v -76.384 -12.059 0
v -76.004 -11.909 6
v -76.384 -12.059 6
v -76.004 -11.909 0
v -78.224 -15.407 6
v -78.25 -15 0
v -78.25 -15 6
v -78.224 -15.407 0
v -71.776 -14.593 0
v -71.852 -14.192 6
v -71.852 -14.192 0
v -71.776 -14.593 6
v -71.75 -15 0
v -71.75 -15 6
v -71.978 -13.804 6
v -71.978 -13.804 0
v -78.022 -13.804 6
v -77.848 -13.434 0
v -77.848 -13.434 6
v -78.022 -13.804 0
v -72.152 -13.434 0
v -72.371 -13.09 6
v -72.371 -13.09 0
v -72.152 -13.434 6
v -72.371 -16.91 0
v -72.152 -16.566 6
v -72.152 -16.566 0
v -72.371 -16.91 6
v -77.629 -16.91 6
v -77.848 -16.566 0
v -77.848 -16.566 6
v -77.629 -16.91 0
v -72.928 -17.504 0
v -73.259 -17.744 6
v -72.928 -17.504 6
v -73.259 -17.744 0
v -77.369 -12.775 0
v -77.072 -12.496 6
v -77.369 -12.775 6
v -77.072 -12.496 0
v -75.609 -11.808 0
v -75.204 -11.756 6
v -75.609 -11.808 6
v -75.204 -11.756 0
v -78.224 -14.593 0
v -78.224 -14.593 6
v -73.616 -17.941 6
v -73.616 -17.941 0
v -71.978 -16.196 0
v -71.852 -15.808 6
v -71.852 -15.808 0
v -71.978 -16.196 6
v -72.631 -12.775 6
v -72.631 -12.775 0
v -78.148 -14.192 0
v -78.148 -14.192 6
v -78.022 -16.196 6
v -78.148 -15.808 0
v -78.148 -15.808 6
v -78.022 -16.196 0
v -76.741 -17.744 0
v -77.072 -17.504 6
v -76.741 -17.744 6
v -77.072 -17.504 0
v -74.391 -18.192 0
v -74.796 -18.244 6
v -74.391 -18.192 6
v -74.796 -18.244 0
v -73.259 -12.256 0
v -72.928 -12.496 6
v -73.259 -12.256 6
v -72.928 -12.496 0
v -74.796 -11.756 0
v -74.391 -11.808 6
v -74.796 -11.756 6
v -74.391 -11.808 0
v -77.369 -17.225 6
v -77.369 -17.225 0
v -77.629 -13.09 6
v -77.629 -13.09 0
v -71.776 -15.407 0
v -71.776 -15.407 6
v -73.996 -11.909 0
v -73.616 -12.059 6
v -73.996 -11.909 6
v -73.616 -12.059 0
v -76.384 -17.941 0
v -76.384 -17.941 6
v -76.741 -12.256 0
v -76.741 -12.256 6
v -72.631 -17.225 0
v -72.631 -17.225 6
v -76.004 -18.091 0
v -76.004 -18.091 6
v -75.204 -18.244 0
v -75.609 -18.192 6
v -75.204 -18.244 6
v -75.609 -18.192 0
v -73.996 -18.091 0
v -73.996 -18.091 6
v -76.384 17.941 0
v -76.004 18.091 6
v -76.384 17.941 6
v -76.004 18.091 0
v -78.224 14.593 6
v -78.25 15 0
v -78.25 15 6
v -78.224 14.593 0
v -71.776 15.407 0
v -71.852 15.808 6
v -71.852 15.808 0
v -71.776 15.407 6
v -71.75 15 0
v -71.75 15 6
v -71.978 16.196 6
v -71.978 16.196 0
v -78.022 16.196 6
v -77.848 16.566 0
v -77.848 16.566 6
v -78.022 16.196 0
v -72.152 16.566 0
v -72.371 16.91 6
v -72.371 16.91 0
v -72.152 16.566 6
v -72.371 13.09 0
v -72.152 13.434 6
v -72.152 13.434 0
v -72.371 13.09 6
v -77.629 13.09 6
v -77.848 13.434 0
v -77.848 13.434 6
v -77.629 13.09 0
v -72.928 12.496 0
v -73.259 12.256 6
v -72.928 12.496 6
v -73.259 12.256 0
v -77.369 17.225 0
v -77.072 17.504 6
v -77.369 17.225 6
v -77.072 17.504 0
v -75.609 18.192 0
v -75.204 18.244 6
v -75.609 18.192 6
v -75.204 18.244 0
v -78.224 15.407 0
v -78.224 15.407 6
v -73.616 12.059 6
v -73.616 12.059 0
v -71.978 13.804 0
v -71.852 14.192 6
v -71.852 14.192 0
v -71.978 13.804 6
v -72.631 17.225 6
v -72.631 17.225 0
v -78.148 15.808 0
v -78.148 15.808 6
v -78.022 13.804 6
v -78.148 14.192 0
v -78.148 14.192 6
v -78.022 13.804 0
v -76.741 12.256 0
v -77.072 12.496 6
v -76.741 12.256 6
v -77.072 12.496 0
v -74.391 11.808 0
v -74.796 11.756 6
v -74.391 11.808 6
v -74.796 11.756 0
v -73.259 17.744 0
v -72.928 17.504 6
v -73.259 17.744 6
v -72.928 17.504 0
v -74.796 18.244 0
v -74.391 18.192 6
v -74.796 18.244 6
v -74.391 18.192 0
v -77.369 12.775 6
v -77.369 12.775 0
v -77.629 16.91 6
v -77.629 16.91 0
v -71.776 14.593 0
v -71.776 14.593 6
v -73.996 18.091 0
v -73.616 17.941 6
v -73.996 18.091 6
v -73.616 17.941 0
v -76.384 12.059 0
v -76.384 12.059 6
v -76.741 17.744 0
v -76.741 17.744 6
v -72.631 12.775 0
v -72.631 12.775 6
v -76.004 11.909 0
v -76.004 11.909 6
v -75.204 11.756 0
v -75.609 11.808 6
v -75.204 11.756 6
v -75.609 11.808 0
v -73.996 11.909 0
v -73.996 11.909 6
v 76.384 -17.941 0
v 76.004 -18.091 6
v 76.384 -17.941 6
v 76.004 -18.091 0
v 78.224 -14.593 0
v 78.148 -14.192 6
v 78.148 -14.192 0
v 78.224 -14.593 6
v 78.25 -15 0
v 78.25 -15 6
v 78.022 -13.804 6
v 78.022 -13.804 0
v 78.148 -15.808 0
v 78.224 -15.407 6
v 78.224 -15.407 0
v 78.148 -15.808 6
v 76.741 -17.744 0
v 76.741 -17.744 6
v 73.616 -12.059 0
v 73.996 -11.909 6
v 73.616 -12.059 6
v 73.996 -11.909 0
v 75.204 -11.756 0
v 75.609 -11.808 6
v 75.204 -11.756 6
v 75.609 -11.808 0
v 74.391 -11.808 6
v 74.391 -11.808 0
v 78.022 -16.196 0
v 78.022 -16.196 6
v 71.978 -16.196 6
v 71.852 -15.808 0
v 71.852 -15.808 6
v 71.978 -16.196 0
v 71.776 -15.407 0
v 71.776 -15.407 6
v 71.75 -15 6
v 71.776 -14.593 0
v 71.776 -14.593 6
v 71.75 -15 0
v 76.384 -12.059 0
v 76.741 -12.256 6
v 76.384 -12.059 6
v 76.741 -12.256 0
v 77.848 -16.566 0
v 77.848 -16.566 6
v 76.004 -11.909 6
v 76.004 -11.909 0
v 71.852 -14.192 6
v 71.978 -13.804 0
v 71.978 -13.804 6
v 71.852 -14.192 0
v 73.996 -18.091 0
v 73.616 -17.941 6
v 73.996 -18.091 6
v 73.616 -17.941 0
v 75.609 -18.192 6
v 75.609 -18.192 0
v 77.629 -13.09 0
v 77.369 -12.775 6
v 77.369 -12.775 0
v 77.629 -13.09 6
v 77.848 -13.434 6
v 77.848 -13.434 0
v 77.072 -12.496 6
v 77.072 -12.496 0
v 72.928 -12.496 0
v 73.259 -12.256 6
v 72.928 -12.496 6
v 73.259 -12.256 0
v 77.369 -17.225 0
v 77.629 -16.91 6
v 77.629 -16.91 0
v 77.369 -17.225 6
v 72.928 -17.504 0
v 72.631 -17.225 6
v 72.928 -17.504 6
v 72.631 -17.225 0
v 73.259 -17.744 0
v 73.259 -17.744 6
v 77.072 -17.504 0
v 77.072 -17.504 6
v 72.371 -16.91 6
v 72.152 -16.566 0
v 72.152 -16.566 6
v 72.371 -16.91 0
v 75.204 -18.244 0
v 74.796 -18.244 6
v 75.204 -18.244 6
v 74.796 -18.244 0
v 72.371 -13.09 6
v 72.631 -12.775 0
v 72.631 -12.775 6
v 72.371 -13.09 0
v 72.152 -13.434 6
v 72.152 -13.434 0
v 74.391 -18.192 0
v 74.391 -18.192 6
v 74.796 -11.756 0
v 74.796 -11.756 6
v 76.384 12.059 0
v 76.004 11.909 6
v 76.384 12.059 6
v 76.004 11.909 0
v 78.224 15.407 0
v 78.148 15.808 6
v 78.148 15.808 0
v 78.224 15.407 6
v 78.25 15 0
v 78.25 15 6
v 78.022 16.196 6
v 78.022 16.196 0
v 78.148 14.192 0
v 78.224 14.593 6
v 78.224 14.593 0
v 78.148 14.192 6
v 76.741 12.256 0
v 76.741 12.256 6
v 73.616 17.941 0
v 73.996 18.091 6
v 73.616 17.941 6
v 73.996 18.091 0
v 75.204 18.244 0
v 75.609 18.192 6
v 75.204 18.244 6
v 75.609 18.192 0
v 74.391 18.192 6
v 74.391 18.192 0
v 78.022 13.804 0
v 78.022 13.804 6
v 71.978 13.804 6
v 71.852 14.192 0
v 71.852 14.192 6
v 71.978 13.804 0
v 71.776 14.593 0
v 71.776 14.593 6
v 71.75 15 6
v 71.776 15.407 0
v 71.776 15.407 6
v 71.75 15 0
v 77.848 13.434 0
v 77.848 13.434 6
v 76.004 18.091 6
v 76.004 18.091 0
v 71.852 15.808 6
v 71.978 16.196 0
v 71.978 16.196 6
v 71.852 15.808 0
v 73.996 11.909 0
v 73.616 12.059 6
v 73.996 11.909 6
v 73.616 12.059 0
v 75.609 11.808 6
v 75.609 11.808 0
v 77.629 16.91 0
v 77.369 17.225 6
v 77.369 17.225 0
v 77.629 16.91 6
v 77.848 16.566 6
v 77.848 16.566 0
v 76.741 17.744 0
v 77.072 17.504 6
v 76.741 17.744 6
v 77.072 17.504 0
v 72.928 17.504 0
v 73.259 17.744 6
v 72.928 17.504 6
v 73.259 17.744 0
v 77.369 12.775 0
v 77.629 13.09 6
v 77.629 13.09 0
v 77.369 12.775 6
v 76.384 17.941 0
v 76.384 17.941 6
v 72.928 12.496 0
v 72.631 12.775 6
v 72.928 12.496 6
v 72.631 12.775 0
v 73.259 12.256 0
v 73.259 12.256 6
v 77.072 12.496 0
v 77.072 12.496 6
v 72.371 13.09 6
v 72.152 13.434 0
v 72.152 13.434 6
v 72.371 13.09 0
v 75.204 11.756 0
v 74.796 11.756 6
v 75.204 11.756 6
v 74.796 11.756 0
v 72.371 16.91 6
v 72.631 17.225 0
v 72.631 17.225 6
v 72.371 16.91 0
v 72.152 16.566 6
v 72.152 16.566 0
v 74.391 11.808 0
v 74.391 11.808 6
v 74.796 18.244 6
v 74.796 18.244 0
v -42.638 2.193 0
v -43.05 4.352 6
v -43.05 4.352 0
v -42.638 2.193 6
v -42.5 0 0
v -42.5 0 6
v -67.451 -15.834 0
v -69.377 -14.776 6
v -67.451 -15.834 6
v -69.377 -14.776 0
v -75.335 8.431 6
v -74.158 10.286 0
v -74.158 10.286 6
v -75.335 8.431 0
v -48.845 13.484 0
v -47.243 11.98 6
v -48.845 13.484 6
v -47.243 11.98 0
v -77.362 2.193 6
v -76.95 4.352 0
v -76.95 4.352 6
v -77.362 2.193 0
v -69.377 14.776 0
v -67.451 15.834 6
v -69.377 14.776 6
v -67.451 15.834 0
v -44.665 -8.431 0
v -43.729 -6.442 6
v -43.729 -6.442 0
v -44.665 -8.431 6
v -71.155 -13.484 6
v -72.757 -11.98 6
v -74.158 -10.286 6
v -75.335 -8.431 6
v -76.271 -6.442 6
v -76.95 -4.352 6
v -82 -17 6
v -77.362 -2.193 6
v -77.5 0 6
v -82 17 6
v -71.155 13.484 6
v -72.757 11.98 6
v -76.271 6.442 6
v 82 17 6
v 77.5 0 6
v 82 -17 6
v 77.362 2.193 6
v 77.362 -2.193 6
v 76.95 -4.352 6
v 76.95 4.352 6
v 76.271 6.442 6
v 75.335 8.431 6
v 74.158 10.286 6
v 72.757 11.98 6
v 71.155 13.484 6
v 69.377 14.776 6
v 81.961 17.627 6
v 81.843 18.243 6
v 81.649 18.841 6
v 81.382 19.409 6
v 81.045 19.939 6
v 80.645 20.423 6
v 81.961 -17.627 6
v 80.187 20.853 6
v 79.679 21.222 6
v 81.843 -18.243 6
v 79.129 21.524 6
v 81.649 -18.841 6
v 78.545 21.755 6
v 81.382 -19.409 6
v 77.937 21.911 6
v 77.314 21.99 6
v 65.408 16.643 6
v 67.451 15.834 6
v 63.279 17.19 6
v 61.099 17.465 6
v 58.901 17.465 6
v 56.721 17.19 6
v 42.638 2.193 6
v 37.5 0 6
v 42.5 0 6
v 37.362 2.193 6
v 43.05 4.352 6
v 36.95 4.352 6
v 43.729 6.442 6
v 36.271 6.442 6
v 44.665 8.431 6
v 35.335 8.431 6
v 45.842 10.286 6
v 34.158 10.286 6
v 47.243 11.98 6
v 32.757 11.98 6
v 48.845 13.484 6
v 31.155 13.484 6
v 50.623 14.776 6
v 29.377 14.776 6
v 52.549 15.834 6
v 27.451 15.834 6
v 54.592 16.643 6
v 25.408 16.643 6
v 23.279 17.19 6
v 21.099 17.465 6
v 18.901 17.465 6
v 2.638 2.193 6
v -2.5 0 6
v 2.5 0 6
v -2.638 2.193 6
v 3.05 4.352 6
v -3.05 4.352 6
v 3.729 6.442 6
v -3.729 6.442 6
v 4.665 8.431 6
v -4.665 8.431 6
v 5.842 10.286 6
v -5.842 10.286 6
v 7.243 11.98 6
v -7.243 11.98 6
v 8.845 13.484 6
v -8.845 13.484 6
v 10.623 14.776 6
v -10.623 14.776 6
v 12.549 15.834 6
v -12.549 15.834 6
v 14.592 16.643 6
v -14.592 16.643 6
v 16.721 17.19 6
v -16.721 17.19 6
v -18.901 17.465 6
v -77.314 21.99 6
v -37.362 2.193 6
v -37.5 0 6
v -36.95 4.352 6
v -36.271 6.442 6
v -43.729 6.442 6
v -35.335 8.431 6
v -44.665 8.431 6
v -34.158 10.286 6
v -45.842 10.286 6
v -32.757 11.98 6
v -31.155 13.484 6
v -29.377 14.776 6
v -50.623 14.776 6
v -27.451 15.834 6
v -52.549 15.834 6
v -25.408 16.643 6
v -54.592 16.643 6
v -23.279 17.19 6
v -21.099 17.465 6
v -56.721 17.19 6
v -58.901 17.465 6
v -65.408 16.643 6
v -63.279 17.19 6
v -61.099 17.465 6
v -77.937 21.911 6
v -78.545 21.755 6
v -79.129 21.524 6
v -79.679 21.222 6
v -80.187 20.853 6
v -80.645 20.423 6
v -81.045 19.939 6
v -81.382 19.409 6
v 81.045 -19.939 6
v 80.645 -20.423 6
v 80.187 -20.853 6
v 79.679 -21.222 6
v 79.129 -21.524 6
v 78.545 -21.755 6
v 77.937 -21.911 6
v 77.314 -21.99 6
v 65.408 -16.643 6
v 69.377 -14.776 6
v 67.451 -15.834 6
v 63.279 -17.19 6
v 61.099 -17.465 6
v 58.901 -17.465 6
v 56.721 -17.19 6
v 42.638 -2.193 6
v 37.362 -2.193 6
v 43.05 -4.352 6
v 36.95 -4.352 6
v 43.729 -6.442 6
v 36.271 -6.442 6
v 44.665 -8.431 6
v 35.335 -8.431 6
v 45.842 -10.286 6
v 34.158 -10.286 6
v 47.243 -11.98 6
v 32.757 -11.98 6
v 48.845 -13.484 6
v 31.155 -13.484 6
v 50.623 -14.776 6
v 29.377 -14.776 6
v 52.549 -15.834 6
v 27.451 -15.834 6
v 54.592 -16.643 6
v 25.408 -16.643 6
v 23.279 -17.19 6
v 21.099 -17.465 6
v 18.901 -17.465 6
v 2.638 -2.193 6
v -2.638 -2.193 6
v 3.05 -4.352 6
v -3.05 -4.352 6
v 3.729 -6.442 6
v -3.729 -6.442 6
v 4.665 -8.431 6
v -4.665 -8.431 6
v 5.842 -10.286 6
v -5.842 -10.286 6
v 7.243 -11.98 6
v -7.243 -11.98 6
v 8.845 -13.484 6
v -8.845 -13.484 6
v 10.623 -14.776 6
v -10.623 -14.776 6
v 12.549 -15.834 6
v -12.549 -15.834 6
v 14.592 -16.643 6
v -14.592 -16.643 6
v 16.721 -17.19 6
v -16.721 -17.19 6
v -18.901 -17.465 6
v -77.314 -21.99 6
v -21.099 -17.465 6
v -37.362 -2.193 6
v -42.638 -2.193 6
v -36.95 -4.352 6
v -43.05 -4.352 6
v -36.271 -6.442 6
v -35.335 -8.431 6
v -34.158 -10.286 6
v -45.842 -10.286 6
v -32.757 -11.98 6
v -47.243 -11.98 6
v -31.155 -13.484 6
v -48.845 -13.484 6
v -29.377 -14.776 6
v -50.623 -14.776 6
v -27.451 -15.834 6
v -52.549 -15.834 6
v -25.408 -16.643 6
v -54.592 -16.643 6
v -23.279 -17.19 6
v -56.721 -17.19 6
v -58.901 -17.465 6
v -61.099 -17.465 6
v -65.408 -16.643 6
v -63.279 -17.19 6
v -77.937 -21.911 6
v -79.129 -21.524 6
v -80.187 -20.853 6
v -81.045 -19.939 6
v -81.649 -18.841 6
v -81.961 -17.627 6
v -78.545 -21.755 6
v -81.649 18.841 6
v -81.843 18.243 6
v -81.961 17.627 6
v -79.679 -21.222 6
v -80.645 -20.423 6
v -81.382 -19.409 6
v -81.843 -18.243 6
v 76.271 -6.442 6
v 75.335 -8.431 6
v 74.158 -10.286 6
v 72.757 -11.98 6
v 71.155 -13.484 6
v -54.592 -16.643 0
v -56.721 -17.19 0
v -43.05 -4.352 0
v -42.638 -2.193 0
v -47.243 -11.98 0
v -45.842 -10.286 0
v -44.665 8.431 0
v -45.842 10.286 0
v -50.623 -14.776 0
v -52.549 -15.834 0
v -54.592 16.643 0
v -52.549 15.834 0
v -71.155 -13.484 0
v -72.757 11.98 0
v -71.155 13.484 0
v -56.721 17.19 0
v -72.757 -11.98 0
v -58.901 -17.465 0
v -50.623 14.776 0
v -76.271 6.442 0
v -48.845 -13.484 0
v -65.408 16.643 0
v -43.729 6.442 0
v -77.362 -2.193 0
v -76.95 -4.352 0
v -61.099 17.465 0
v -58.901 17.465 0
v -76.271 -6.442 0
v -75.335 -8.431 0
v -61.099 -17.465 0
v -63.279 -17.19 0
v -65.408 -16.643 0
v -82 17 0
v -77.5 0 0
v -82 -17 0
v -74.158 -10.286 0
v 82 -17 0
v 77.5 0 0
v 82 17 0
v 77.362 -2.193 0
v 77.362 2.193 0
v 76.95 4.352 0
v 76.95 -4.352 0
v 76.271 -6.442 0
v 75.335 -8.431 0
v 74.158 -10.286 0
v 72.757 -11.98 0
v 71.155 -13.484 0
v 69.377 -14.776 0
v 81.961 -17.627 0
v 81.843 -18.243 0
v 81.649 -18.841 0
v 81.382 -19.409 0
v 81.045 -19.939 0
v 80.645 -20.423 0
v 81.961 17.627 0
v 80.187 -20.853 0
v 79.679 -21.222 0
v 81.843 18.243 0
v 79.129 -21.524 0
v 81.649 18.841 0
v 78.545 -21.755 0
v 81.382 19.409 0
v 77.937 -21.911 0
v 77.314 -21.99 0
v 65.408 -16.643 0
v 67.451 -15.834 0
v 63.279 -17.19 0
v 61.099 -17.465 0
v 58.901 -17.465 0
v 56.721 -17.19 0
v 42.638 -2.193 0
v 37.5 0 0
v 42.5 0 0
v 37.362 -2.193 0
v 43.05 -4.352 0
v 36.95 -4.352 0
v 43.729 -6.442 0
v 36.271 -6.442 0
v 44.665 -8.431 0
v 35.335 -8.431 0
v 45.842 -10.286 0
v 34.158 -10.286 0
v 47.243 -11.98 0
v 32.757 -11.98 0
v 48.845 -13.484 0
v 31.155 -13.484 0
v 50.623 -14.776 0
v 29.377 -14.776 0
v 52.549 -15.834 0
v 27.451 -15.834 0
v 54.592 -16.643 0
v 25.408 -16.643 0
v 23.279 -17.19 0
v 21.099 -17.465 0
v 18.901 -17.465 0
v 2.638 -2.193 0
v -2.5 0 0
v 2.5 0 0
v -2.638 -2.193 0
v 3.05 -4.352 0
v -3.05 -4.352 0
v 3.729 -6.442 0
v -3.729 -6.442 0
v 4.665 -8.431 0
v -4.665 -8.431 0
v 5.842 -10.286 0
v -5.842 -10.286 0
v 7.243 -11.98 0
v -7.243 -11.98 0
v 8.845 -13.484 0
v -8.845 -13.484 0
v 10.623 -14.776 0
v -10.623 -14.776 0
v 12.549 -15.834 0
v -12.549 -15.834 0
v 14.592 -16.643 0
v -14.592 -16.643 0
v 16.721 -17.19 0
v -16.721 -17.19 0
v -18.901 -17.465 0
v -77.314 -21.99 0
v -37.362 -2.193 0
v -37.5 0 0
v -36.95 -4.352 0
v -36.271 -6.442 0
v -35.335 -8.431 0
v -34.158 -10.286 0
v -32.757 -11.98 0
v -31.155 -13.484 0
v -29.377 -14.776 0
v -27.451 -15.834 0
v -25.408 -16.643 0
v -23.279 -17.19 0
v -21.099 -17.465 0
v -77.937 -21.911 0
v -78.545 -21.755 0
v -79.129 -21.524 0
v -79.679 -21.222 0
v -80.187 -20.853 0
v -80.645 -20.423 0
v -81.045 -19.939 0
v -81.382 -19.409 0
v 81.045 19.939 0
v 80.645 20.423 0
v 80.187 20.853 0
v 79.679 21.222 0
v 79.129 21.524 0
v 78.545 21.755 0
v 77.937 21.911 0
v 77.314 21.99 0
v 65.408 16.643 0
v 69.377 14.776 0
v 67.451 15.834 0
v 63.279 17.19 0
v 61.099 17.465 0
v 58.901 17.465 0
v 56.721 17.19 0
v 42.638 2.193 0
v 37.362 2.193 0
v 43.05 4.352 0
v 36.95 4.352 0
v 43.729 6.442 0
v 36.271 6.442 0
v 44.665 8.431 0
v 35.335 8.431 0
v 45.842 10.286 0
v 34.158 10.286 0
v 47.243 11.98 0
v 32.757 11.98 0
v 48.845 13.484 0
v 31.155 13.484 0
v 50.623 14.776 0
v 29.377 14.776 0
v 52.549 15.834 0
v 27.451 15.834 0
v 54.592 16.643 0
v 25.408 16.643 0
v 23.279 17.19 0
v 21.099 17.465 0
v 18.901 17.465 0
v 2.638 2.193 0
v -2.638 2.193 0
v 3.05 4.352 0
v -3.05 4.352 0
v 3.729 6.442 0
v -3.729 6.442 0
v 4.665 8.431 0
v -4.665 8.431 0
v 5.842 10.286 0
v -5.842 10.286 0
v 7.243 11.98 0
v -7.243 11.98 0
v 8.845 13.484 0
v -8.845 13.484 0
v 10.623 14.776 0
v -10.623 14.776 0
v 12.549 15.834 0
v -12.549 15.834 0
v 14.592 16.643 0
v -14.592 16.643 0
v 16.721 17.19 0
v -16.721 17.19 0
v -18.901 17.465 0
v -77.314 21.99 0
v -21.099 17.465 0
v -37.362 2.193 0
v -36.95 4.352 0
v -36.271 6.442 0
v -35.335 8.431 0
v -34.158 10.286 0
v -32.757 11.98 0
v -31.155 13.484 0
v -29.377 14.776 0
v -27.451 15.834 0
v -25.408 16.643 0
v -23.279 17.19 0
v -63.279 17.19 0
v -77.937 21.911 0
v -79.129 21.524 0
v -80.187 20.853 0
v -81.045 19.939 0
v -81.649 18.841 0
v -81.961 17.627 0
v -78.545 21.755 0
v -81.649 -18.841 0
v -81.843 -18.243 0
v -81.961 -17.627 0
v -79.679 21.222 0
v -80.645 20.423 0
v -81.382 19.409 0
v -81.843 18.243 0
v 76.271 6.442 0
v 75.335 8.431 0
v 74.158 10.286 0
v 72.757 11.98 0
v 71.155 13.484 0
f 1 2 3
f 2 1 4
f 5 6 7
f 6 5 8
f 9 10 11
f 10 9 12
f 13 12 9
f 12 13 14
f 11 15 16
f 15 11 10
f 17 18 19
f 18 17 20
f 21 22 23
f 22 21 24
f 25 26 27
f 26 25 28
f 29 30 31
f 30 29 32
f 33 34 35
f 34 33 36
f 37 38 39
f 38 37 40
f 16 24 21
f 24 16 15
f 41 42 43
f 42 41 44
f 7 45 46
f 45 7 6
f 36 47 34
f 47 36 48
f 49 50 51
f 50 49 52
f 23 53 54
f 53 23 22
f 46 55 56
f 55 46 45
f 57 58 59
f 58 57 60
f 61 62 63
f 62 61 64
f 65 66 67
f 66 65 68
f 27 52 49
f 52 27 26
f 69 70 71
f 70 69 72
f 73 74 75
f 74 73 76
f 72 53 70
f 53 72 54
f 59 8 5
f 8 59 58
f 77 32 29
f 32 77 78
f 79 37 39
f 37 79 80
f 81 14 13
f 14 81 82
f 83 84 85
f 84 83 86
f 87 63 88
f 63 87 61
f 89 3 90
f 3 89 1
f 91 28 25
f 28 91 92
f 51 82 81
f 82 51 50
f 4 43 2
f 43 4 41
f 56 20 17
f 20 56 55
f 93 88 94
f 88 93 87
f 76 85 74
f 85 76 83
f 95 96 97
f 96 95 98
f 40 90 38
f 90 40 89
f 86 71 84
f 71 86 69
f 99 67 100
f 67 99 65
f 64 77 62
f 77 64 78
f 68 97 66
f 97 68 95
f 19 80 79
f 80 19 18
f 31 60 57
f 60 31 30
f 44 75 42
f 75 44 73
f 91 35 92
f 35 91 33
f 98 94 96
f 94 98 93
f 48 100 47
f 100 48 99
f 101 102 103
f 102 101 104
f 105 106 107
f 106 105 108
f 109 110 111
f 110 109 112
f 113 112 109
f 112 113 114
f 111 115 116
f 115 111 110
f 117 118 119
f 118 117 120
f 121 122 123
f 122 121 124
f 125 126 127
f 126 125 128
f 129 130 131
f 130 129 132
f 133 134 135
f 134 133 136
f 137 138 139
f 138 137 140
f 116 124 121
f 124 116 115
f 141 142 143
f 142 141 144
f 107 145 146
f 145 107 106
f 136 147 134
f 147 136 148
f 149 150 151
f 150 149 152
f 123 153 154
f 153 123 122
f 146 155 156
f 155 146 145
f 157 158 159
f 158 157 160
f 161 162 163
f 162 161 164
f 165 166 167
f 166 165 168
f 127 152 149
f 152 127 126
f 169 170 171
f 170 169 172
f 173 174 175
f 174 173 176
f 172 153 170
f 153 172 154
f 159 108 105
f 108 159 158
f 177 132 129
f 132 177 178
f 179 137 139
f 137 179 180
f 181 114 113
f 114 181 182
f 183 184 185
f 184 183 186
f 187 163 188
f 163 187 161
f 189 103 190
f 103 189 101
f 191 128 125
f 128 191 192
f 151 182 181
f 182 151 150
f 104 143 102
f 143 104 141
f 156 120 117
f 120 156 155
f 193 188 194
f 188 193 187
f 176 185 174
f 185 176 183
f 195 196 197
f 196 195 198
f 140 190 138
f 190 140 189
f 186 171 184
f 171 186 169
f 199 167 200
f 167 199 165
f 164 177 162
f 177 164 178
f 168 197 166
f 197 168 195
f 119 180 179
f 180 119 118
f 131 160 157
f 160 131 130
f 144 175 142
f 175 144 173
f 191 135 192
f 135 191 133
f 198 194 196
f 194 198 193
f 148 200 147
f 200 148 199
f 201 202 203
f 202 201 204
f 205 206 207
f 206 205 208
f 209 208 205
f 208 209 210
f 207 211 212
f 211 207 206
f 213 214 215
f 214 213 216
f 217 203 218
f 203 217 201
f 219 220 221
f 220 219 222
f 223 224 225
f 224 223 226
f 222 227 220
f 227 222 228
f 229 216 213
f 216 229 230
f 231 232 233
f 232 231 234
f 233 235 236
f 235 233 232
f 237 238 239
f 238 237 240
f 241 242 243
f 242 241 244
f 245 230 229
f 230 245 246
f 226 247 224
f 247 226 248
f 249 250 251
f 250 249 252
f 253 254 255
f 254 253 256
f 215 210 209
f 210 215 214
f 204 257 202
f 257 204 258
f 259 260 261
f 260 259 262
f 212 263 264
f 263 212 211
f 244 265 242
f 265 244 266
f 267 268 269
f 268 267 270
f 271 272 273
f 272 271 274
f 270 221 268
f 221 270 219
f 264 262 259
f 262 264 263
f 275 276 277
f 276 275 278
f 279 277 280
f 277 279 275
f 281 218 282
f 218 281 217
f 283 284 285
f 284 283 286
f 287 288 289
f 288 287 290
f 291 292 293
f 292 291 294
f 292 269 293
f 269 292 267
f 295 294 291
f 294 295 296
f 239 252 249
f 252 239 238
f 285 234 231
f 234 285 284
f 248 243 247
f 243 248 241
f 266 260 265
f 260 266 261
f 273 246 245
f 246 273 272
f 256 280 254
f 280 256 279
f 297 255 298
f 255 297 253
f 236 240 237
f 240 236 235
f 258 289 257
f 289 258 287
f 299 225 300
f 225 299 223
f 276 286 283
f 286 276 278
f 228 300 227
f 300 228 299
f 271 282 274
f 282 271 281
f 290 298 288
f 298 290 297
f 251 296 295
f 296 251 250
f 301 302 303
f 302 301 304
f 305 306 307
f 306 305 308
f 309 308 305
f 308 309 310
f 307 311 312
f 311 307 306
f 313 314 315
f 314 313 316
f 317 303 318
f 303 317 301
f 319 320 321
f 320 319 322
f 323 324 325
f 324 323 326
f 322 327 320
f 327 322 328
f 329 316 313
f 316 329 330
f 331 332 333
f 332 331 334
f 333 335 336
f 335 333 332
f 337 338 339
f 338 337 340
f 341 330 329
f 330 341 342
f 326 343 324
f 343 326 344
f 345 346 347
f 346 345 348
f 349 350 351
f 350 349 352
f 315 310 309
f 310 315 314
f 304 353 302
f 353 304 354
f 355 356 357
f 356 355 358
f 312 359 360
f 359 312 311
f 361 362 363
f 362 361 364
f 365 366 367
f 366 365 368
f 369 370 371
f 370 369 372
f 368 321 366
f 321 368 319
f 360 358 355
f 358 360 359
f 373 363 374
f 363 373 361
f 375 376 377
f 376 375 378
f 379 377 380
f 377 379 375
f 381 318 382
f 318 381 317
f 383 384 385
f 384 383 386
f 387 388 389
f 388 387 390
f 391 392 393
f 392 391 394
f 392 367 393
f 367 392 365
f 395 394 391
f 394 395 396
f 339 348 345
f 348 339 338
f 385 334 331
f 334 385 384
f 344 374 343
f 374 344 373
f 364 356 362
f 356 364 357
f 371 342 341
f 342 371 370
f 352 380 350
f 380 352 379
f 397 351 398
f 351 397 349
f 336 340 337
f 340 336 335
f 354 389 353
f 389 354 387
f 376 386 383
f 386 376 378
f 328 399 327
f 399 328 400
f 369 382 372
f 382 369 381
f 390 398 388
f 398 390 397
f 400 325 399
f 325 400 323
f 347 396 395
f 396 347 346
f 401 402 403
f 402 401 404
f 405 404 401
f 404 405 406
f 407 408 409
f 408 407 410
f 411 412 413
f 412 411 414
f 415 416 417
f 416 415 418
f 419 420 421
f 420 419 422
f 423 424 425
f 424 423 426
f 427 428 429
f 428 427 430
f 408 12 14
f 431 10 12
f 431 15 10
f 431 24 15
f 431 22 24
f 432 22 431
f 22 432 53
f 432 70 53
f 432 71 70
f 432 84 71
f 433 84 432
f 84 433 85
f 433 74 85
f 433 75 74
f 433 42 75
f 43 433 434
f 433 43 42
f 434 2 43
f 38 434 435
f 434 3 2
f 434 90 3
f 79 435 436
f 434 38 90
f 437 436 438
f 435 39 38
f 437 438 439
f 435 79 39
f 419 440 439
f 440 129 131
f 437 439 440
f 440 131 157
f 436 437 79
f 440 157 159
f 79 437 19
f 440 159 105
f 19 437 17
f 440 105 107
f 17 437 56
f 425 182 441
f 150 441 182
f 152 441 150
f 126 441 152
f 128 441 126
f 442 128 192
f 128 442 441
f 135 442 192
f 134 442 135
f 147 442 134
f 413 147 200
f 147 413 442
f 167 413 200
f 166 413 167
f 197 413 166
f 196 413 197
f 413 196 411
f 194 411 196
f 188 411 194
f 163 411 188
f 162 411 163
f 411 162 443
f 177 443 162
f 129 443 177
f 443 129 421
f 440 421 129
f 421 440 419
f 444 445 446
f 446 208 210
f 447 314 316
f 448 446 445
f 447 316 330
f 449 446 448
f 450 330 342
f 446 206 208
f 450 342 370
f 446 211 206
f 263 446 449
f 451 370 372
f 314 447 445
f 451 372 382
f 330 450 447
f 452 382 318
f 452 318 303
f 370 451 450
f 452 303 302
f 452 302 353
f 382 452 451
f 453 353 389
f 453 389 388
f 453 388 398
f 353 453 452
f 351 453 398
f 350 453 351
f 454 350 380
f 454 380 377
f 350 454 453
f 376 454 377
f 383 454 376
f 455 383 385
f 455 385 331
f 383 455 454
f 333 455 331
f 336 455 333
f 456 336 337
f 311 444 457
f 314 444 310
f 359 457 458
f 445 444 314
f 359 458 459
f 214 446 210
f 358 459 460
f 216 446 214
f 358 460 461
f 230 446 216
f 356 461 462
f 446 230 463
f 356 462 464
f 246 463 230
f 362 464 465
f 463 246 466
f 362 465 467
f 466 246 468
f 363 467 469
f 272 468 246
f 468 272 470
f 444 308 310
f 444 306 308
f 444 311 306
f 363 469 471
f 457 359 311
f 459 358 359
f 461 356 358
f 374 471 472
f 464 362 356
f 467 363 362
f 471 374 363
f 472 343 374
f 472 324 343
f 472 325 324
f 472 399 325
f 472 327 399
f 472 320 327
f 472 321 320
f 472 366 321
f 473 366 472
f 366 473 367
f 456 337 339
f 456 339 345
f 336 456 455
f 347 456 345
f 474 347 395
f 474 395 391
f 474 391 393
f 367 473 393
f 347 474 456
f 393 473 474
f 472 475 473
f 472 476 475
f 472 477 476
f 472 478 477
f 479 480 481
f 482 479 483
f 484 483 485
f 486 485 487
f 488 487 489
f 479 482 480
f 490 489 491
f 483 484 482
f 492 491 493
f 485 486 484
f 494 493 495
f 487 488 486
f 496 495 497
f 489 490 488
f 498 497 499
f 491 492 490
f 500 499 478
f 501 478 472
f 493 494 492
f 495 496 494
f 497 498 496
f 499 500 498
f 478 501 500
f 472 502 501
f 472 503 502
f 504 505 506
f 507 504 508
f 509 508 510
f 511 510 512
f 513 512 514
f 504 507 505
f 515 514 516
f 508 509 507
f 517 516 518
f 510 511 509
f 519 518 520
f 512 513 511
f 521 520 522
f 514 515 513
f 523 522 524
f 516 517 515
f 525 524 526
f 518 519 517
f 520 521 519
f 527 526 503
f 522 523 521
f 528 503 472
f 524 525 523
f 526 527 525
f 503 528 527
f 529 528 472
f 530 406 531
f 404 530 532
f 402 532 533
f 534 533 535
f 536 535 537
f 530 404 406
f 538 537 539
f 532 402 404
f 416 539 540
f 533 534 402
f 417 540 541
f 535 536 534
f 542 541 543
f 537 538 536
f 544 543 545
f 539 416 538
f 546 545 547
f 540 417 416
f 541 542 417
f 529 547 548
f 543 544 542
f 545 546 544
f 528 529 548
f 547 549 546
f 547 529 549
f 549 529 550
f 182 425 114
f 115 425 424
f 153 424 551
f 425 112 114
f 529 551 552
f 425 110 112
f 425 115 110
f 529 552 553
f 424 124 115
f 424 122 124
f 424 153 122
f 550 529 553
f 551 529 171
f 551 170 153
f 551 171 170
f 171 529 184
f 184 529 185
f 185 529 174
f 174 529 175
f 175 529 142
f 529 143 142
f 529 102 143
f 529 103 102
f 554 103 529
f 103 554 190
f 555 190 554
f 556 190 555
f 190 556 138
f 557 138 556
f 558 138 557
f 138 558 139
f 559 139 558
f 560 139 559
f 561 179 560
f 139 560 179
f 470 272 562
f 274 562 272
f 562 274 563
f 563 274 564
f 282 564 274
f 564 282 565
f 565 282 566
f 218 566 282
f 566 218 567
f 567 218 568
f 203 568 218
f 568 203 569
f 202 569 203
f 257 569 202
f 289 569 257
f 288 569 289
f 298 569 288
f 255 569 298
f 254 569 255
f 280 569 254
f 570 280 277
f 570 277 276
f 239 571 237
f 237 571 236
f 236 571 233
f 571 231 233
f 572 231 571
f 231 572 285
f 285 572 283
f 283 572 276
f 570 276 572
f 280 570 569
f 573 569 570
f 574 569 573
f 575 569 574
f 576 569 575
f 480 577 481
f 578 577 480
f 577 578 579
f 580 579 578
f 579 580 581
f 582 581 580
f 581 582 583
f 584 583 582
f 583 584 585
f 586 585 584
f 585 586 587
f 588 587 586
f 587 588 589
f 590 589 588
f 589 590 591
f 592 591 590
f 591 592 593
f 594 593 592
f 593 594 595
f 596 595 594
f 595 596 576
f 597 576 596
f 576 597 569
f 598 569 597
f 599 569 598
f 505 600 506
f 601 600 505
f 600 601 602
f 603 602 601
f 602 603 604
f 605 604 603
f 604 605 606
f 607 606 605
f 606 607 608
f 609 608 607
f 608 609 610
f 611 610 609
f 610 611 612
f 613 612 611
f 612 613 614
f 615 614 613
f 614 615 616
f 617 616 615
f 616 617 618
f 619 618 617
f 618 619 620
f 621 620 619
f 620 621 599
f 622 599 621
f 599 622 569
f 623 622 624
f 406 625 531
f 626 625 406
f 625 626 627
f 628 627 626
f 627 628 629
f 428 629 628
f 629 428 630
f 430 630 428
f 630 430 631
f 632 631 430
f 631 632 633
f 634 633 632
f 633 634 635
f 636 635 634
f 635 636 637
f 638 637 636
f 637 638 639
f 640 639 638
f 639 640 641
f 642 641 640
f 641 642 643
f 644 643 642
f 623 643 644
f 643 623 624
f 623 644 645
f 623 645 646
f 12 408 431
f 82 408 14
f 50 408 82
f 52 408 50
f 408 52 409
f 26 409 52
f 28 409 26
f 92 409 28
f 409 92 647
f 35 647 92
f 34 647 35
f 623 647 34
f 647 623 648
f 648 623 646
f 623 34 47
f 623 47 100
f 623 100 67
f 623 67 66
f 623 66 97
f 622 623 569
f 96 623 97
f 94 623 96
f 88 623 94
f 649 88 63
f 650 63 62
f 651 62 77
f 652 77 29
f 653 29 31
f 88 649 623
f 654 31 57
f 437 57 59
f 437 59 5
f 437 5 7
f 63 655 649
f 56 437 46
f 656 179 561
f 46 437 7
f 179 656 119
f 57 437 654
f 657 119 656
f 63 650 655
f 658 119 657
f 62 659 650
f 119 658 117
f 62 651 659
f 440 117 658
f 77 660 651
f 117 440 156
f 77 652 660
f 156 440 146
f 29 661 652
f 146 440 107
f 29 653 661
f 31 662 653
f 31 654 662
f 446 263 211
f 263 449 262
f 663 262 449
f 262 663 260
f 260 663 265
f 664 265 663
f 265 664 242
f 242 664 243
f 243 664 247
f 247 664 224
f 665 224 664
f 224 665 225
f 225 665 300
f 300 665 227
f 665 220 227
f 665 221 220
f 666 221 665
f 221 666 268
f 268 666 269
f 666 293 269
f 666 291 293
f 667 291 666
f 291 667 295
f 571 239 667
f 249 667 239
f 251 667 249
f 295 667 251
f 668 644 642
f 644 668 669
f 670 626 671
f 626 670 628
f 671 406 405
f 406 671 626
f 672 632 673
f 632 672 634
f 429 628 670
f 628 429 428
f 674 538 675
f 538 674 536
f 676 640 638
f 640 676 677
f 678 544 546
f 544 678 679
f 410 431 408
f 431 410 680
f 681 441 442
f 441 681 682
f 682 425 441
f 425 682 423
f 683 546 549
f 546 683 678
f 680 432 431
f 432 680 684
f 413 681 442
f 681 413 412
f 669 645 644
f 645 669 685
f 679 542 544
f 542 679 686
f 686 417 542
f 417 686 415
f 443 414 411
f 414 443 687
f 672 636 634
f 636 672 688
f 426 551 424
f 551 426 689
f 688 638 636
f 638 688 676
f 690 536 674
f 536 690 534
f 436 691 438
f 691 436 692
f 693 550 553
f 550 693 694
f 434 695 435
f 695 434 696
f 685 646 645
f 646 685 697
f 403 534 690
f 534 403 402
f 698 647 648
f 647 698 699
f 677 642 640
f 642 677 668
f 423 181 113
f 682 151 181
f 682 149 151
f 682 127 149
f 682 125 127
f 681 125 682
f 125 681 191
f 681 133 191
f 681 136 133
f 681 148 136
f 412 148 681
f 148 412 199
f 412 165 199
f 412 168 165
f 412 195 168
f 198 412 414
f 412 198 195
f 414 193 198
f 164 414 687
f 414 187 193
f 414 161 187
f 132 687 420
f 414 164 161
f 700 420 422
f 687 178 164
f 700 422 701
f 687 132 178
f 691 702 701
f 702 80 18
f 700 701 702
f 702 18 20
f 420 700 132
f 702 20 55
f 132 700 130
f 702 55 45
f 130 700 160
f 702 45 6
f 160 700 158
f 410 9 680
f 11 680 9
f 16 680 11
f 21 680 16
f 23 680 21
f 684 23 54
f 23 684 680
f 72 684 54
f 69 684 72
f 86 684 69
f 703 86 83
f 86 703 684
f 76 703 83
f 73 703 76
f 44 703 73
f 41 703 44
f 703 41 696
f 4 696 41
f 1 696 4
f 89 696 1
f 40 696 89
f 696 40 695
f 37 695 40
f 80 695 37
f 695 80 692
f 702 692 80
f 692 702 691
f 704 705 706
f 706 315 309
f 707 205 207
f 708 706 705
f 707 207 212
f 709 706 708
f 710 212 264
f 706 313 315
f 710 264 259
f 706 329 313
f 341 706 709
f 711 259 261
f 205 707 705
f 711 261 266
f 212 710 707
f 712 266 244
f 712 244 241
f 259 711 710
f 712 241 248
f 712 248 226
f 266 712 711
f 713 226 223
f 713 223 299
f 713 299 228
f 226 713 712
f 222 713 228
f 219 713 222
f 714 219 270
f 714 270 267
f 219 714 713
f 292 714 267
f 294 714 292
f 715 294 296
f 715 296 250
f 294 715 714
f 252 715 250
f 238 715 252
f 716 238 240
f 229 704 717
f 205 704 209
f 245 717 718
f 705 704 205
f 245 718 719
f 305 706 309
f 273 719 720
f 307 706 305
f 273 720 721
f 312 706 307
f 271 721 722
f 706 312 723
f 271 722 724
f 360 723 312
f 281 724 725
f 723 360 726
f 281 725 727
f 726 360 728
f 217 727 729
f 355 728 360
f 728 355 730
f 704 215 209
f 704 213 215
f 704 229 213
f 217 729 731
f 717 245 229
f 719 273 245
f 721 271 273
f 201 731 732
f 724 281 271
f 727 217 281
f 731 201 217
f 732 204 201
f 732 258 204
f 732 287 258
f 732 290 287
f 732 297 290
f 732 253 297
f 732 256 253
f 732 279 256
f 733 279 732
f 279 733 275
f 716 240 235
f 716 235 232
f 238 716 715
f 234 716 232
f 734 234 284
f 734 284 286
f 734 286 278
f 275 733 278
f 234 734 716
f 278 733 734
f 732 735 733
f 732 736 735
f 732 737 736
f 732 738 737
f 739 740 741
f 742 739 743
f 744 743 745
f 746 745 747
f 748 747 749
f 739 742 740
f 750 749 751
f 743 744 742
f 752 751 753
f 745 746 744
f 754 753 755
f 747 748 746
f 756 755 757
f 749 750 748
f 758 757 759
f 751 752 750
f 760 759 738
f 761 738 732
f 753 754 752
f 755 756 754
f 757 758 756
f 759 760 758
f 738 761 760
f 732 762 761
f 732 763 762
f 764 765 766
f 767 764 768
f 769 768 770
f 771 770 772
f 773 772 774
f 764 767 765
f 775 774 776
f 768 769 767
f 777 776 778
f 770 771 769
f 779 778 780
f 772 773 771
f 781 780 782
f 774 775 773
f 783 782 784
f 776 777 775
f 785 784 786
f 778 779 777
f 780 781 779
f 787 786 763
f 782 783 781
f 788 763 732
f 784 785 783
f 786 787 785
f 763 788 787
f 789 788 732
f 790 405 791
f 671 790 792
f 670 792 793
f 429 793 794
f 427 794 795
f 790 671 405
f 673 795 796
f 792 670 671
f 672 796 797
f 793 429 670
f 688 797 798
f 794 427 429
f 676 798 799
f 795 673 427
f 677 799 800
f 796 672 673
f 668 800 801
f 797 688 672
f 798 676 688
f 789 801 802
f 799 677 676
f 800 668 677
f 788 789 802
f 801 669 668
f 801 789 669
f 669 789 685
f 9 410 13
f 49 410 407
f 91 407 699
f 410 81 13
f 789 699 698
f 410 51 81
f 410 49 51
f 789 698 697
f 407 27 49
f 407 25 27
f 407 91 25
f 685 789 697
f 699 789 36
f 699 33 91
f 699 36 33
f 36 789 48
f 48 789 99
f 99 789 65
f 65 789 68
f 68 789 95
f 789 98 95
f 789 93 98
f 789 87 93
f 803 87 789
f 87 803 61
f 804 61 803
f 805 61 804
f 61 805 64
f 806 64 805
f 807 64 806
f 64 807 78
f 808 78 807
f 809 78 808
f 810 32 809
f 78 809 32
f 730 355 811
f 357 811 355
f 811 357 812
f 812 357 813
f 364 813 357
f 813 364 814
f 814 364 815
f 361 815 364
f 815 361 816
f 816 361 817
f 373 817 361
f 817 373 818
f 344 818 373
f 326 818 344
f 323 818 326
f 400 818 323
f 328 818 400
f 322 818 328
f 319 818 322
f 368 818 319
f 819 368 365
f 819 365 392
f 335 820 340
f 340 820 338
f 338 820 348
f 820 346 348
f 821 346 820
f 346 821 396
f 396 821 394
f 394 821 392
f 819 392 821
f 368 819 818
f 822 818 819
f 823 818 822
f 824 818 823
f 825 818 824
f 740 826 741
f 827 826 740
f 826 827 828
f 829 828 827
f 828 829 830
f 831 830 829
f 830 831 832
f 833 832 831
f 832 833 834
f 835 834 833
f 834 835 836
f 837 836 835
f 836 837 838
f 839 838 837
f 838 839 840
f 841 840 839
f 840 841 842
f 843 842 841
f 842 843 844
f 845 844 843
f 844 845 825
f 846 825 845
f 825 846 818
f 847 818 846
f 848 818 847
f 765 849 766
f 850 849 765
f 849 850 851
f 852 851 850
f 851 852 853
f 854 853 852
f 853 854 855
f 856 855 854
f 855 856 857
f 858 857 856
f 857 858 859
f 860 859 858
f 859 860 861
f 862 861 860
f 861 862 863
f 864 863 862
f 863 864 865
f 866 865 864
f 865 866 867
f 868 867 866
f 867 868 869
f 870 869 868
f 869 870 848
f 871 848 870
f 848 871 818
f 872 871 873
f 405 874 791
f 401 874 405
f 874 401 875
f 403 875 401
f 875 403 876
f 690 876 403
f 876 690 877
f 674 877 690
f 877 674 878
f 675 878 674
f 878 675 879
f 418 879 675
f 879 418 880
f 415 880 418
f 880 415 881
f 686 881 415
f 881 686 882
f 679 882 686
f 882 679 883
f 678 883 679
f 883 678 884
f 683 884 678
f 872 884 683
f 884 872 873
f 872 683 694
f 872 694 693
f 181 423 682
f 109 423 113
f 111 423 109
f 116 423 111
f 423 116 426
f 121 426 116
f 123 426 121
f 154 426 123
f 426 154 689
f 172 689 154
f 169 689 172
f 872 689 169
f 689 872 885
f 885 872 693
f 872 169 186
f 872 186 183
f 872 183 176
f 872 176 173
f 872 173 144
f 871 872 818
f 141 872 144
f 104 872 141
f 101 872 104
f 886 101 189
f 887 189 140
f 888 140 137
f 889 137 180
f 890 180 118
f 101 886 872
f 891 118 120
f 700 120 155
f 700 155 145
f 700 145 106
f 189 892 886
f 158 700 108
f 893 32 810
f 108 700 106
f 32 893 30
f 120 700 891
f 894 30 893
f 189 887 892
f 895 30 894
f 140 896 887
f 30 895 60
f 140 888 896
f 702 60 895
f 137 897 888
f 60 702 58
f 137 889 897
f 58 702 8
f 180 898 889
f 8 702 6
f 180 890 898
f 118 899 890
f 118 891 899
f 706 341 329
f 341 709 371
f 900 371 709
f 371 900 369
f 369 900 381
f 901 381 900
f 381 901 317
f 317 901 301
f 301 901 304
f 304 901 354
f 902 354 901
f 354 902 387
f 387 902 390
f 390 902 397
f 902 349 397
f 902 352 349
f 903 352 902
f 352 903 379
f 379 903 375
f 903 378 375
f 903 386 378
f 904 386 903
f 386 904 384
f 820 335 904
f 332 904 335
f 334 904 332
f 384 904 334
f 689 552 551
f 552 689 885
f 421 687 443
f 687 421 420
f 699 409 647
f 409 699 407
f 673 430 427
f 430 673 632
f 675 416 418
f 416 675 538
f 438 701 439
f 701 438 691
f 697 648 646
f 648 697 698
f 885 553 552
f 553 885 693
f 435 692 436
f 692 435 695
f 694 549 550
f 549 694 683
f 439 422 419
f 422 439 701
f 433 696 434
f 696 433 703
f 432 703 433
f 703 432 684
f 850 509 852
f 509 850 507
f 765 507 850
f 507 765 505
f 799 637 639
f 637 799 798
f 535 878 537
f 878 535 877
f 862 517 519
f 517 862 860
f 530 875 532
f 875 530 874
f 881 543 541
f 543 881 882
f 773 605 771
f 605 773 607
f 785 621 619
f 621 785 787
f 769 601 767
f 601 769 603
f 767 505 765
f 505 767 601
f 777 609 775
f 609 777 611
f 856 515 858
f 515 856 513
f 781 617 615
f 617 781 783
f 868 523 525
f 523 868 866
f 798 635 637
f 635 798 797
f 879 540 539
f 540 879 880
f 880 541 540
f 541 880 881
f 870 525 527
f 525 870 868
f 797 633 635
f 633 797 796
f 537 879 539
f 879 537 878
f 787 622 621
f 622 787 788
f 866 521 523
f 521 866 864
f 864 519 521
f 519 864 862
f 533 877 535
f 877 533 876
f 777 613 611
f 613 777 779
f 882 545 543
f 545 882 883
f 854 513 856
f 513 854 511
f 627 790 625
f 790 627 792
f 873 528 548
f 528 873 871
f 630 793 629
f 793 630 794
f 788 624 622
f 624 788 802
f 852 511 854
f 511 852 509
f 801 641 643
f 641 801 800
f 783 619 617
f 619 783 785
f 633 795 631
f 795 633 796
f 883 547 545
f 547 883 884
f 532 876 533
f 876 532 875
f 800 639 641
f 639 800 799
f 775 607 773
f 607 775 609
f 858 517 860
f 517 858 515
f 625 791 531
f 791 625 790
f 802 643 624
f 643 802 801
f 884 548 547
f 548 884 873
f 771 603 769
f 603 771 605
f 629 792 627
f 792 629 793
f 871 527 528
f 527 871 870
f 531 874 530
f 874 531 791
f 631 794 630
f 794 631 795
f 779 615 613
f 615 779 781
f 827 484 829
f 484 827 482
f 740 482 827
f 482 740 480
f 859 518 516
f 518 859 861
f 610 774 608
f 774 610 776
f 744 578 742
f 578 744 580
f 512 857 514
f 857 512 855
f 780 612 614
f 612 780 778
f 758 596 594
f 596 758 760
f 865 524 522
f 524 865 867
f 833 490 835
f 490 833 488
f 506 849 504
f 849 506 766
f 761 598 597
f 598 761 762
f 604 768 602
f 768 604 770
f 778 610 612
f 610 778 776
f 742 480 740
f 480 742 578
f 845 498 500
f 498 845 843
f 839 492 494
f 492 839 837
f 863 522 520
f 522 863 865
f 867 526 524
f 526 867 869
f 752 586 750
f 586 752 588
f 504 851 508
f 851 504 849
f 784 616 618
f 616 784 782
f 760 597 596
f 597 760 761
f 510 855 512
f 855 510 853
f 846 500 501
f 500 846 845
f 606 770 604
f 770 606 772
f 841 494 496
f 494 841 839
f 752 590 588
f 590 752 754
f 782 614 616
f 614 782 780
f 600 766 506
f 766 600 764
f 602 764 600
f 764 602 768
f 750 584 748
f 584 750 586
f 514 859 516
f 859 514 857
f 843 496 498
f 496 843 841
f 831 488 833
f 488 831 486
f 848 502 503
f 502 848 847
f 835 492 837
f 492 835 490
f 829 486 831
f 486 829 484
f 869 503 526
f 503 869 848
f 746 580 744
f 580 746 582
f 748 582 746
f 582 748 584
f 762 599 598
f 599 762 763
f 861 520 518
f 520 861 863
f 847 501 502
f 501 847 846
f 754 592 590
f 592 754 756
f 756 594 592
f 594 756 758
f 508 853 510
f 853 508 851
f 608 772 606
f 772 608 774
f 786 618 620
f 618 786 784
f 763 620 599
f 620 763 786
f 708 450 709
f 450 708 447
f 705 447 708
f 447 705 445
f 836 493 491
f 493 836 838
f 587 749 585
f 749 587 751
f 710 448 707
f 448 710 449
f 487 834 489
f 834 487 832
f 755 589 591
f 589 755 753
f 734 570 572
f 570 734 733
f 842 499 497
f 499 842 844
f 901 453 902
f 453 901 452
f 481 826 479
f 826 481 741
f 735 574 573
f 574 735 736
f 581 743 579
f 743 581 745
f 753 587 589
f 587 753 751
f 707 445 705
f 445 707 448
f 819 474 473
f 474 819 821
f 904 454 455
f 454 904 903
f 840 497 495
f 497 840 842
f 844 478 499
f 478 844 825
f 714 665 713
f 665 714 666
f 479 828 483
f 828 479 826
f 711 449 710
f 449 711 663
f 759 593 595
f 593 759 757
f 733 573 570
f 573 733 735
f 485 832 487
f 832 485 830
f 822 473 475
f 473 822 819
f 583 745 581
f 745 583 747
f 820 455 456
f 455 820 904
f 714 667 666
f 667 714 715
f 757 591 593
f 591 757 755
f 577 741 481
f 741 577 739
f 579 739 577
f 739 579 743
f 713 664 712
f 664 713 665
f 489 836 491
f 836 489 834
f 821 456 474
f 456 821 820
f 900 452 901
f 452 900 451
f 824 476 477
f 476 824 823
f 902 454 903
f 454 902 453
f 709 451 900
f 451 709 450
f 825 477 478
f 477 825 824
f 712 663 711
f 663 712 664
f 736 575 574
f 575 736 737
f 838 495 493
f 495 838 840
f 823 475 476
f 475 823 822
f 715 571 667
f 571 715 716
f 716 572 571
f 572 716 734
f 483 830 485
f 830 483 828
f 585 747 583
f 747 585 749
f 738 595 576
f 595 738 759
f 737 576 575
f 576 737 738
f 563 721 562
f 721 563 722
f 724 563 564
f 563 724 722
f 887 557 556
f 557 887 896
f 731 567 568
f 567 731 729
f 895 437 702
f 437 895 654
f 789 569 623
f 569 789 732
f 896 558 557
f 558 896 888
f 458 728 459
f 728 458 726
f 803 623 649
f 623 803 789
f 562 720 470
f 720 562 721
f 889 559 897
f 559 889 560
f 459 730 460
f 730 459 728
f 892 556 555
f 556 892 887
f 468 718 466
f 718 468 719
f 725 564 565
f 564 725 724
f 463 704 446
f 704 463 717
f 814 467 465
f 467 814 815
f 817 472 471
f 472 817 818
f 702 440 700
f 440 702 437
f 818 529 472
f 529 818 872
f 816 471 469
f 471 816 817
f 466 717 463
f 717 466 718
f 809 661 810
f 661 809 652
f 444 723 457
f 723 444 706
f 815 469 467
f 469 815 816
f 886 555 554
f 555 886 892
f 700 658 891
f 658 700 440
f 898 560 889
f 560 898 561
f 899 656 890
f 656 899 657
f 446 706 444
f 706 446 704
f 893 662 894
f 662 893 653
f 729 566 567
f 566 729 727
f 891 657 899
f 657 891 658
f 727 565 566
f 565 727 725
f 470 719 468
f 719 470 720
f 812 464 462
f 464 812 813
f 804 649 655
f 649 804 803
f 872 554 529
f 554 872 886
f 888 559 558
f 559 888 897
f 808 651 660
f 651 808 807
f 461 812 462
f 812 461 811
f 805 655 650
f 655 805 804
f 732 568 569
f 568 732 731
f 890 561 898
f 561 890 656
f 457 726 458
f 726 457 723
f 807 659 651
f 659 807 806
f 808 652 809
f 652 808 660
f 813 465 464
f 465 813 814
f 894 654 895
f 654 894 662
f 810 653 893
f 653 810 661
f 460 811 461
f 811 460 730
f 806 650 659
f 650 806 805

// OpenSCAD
$fn = 50;

difference() {
	union() {
		hull() {
			translate(v = [-77.0, 17.0, 0]) {
				cylinder(h = 6, r = 5);
			}
			translate(v = [77.0, 17.0, 0]) {
				cylinder(h = 6, r = 5);
			}
			translate(v = [-77.0, -17.0, 0]) {
				cylinder(h = 6, r = 5);
			}
			translate(v = [77.0, -17.0, 0]) {
				cylinder(h = 6, r = 5);
			}
		}
	}
	union() {
		translate(v = [-75.0, -15.0, -100.0]) {
			cylinder(h = 200, r = 3.25);
		}
		translate(v = [-75.0, 15.0, -100.0]) {
			cylinder(h = 200, r = 3.25);
		}
		translate(v = [75.0, -15.0, -100.0]) {
			cylinder(h = 200, r = 3.25);
		}
		translate(v = [75.0, 15.0, -100.0]) {
			cylinder(h = 200, r = 3.25);
		}
		translate(v = [-75.0, -15.0, -100.0]) {
			cylinder(h = 200, r = 1.8);
		}
		translate(v = [-75.0, 15.0, -100.0]) {
			cylinder(h = 200, r = 1.8);
		}
		translate(v = [75.0, -15.0, -100.0]) {
			cylinder(h = 200, r = 1.8);
		}
		translate(v = [75.0, 15.0, -100.0]) {
			cylinder(h = 200, r = 1.8);
		}
		translate(v = [-60.0, 0, 0.0]) {
			cylinder(h = 6, r = 17.5);
		}
		translate(v = [-20.0, 0, 0.0]) {
			cylinder(h = 6, r = 17.5);
		}
		translate(v = [20.0, 0, 0.0]) {
			cylinder(h = 6, r = 17.5);
		}
		translate(v = [60.0, 0, 0.0]) {
			cylinder(h = 6, r = 17.5);
		}
	}
}
